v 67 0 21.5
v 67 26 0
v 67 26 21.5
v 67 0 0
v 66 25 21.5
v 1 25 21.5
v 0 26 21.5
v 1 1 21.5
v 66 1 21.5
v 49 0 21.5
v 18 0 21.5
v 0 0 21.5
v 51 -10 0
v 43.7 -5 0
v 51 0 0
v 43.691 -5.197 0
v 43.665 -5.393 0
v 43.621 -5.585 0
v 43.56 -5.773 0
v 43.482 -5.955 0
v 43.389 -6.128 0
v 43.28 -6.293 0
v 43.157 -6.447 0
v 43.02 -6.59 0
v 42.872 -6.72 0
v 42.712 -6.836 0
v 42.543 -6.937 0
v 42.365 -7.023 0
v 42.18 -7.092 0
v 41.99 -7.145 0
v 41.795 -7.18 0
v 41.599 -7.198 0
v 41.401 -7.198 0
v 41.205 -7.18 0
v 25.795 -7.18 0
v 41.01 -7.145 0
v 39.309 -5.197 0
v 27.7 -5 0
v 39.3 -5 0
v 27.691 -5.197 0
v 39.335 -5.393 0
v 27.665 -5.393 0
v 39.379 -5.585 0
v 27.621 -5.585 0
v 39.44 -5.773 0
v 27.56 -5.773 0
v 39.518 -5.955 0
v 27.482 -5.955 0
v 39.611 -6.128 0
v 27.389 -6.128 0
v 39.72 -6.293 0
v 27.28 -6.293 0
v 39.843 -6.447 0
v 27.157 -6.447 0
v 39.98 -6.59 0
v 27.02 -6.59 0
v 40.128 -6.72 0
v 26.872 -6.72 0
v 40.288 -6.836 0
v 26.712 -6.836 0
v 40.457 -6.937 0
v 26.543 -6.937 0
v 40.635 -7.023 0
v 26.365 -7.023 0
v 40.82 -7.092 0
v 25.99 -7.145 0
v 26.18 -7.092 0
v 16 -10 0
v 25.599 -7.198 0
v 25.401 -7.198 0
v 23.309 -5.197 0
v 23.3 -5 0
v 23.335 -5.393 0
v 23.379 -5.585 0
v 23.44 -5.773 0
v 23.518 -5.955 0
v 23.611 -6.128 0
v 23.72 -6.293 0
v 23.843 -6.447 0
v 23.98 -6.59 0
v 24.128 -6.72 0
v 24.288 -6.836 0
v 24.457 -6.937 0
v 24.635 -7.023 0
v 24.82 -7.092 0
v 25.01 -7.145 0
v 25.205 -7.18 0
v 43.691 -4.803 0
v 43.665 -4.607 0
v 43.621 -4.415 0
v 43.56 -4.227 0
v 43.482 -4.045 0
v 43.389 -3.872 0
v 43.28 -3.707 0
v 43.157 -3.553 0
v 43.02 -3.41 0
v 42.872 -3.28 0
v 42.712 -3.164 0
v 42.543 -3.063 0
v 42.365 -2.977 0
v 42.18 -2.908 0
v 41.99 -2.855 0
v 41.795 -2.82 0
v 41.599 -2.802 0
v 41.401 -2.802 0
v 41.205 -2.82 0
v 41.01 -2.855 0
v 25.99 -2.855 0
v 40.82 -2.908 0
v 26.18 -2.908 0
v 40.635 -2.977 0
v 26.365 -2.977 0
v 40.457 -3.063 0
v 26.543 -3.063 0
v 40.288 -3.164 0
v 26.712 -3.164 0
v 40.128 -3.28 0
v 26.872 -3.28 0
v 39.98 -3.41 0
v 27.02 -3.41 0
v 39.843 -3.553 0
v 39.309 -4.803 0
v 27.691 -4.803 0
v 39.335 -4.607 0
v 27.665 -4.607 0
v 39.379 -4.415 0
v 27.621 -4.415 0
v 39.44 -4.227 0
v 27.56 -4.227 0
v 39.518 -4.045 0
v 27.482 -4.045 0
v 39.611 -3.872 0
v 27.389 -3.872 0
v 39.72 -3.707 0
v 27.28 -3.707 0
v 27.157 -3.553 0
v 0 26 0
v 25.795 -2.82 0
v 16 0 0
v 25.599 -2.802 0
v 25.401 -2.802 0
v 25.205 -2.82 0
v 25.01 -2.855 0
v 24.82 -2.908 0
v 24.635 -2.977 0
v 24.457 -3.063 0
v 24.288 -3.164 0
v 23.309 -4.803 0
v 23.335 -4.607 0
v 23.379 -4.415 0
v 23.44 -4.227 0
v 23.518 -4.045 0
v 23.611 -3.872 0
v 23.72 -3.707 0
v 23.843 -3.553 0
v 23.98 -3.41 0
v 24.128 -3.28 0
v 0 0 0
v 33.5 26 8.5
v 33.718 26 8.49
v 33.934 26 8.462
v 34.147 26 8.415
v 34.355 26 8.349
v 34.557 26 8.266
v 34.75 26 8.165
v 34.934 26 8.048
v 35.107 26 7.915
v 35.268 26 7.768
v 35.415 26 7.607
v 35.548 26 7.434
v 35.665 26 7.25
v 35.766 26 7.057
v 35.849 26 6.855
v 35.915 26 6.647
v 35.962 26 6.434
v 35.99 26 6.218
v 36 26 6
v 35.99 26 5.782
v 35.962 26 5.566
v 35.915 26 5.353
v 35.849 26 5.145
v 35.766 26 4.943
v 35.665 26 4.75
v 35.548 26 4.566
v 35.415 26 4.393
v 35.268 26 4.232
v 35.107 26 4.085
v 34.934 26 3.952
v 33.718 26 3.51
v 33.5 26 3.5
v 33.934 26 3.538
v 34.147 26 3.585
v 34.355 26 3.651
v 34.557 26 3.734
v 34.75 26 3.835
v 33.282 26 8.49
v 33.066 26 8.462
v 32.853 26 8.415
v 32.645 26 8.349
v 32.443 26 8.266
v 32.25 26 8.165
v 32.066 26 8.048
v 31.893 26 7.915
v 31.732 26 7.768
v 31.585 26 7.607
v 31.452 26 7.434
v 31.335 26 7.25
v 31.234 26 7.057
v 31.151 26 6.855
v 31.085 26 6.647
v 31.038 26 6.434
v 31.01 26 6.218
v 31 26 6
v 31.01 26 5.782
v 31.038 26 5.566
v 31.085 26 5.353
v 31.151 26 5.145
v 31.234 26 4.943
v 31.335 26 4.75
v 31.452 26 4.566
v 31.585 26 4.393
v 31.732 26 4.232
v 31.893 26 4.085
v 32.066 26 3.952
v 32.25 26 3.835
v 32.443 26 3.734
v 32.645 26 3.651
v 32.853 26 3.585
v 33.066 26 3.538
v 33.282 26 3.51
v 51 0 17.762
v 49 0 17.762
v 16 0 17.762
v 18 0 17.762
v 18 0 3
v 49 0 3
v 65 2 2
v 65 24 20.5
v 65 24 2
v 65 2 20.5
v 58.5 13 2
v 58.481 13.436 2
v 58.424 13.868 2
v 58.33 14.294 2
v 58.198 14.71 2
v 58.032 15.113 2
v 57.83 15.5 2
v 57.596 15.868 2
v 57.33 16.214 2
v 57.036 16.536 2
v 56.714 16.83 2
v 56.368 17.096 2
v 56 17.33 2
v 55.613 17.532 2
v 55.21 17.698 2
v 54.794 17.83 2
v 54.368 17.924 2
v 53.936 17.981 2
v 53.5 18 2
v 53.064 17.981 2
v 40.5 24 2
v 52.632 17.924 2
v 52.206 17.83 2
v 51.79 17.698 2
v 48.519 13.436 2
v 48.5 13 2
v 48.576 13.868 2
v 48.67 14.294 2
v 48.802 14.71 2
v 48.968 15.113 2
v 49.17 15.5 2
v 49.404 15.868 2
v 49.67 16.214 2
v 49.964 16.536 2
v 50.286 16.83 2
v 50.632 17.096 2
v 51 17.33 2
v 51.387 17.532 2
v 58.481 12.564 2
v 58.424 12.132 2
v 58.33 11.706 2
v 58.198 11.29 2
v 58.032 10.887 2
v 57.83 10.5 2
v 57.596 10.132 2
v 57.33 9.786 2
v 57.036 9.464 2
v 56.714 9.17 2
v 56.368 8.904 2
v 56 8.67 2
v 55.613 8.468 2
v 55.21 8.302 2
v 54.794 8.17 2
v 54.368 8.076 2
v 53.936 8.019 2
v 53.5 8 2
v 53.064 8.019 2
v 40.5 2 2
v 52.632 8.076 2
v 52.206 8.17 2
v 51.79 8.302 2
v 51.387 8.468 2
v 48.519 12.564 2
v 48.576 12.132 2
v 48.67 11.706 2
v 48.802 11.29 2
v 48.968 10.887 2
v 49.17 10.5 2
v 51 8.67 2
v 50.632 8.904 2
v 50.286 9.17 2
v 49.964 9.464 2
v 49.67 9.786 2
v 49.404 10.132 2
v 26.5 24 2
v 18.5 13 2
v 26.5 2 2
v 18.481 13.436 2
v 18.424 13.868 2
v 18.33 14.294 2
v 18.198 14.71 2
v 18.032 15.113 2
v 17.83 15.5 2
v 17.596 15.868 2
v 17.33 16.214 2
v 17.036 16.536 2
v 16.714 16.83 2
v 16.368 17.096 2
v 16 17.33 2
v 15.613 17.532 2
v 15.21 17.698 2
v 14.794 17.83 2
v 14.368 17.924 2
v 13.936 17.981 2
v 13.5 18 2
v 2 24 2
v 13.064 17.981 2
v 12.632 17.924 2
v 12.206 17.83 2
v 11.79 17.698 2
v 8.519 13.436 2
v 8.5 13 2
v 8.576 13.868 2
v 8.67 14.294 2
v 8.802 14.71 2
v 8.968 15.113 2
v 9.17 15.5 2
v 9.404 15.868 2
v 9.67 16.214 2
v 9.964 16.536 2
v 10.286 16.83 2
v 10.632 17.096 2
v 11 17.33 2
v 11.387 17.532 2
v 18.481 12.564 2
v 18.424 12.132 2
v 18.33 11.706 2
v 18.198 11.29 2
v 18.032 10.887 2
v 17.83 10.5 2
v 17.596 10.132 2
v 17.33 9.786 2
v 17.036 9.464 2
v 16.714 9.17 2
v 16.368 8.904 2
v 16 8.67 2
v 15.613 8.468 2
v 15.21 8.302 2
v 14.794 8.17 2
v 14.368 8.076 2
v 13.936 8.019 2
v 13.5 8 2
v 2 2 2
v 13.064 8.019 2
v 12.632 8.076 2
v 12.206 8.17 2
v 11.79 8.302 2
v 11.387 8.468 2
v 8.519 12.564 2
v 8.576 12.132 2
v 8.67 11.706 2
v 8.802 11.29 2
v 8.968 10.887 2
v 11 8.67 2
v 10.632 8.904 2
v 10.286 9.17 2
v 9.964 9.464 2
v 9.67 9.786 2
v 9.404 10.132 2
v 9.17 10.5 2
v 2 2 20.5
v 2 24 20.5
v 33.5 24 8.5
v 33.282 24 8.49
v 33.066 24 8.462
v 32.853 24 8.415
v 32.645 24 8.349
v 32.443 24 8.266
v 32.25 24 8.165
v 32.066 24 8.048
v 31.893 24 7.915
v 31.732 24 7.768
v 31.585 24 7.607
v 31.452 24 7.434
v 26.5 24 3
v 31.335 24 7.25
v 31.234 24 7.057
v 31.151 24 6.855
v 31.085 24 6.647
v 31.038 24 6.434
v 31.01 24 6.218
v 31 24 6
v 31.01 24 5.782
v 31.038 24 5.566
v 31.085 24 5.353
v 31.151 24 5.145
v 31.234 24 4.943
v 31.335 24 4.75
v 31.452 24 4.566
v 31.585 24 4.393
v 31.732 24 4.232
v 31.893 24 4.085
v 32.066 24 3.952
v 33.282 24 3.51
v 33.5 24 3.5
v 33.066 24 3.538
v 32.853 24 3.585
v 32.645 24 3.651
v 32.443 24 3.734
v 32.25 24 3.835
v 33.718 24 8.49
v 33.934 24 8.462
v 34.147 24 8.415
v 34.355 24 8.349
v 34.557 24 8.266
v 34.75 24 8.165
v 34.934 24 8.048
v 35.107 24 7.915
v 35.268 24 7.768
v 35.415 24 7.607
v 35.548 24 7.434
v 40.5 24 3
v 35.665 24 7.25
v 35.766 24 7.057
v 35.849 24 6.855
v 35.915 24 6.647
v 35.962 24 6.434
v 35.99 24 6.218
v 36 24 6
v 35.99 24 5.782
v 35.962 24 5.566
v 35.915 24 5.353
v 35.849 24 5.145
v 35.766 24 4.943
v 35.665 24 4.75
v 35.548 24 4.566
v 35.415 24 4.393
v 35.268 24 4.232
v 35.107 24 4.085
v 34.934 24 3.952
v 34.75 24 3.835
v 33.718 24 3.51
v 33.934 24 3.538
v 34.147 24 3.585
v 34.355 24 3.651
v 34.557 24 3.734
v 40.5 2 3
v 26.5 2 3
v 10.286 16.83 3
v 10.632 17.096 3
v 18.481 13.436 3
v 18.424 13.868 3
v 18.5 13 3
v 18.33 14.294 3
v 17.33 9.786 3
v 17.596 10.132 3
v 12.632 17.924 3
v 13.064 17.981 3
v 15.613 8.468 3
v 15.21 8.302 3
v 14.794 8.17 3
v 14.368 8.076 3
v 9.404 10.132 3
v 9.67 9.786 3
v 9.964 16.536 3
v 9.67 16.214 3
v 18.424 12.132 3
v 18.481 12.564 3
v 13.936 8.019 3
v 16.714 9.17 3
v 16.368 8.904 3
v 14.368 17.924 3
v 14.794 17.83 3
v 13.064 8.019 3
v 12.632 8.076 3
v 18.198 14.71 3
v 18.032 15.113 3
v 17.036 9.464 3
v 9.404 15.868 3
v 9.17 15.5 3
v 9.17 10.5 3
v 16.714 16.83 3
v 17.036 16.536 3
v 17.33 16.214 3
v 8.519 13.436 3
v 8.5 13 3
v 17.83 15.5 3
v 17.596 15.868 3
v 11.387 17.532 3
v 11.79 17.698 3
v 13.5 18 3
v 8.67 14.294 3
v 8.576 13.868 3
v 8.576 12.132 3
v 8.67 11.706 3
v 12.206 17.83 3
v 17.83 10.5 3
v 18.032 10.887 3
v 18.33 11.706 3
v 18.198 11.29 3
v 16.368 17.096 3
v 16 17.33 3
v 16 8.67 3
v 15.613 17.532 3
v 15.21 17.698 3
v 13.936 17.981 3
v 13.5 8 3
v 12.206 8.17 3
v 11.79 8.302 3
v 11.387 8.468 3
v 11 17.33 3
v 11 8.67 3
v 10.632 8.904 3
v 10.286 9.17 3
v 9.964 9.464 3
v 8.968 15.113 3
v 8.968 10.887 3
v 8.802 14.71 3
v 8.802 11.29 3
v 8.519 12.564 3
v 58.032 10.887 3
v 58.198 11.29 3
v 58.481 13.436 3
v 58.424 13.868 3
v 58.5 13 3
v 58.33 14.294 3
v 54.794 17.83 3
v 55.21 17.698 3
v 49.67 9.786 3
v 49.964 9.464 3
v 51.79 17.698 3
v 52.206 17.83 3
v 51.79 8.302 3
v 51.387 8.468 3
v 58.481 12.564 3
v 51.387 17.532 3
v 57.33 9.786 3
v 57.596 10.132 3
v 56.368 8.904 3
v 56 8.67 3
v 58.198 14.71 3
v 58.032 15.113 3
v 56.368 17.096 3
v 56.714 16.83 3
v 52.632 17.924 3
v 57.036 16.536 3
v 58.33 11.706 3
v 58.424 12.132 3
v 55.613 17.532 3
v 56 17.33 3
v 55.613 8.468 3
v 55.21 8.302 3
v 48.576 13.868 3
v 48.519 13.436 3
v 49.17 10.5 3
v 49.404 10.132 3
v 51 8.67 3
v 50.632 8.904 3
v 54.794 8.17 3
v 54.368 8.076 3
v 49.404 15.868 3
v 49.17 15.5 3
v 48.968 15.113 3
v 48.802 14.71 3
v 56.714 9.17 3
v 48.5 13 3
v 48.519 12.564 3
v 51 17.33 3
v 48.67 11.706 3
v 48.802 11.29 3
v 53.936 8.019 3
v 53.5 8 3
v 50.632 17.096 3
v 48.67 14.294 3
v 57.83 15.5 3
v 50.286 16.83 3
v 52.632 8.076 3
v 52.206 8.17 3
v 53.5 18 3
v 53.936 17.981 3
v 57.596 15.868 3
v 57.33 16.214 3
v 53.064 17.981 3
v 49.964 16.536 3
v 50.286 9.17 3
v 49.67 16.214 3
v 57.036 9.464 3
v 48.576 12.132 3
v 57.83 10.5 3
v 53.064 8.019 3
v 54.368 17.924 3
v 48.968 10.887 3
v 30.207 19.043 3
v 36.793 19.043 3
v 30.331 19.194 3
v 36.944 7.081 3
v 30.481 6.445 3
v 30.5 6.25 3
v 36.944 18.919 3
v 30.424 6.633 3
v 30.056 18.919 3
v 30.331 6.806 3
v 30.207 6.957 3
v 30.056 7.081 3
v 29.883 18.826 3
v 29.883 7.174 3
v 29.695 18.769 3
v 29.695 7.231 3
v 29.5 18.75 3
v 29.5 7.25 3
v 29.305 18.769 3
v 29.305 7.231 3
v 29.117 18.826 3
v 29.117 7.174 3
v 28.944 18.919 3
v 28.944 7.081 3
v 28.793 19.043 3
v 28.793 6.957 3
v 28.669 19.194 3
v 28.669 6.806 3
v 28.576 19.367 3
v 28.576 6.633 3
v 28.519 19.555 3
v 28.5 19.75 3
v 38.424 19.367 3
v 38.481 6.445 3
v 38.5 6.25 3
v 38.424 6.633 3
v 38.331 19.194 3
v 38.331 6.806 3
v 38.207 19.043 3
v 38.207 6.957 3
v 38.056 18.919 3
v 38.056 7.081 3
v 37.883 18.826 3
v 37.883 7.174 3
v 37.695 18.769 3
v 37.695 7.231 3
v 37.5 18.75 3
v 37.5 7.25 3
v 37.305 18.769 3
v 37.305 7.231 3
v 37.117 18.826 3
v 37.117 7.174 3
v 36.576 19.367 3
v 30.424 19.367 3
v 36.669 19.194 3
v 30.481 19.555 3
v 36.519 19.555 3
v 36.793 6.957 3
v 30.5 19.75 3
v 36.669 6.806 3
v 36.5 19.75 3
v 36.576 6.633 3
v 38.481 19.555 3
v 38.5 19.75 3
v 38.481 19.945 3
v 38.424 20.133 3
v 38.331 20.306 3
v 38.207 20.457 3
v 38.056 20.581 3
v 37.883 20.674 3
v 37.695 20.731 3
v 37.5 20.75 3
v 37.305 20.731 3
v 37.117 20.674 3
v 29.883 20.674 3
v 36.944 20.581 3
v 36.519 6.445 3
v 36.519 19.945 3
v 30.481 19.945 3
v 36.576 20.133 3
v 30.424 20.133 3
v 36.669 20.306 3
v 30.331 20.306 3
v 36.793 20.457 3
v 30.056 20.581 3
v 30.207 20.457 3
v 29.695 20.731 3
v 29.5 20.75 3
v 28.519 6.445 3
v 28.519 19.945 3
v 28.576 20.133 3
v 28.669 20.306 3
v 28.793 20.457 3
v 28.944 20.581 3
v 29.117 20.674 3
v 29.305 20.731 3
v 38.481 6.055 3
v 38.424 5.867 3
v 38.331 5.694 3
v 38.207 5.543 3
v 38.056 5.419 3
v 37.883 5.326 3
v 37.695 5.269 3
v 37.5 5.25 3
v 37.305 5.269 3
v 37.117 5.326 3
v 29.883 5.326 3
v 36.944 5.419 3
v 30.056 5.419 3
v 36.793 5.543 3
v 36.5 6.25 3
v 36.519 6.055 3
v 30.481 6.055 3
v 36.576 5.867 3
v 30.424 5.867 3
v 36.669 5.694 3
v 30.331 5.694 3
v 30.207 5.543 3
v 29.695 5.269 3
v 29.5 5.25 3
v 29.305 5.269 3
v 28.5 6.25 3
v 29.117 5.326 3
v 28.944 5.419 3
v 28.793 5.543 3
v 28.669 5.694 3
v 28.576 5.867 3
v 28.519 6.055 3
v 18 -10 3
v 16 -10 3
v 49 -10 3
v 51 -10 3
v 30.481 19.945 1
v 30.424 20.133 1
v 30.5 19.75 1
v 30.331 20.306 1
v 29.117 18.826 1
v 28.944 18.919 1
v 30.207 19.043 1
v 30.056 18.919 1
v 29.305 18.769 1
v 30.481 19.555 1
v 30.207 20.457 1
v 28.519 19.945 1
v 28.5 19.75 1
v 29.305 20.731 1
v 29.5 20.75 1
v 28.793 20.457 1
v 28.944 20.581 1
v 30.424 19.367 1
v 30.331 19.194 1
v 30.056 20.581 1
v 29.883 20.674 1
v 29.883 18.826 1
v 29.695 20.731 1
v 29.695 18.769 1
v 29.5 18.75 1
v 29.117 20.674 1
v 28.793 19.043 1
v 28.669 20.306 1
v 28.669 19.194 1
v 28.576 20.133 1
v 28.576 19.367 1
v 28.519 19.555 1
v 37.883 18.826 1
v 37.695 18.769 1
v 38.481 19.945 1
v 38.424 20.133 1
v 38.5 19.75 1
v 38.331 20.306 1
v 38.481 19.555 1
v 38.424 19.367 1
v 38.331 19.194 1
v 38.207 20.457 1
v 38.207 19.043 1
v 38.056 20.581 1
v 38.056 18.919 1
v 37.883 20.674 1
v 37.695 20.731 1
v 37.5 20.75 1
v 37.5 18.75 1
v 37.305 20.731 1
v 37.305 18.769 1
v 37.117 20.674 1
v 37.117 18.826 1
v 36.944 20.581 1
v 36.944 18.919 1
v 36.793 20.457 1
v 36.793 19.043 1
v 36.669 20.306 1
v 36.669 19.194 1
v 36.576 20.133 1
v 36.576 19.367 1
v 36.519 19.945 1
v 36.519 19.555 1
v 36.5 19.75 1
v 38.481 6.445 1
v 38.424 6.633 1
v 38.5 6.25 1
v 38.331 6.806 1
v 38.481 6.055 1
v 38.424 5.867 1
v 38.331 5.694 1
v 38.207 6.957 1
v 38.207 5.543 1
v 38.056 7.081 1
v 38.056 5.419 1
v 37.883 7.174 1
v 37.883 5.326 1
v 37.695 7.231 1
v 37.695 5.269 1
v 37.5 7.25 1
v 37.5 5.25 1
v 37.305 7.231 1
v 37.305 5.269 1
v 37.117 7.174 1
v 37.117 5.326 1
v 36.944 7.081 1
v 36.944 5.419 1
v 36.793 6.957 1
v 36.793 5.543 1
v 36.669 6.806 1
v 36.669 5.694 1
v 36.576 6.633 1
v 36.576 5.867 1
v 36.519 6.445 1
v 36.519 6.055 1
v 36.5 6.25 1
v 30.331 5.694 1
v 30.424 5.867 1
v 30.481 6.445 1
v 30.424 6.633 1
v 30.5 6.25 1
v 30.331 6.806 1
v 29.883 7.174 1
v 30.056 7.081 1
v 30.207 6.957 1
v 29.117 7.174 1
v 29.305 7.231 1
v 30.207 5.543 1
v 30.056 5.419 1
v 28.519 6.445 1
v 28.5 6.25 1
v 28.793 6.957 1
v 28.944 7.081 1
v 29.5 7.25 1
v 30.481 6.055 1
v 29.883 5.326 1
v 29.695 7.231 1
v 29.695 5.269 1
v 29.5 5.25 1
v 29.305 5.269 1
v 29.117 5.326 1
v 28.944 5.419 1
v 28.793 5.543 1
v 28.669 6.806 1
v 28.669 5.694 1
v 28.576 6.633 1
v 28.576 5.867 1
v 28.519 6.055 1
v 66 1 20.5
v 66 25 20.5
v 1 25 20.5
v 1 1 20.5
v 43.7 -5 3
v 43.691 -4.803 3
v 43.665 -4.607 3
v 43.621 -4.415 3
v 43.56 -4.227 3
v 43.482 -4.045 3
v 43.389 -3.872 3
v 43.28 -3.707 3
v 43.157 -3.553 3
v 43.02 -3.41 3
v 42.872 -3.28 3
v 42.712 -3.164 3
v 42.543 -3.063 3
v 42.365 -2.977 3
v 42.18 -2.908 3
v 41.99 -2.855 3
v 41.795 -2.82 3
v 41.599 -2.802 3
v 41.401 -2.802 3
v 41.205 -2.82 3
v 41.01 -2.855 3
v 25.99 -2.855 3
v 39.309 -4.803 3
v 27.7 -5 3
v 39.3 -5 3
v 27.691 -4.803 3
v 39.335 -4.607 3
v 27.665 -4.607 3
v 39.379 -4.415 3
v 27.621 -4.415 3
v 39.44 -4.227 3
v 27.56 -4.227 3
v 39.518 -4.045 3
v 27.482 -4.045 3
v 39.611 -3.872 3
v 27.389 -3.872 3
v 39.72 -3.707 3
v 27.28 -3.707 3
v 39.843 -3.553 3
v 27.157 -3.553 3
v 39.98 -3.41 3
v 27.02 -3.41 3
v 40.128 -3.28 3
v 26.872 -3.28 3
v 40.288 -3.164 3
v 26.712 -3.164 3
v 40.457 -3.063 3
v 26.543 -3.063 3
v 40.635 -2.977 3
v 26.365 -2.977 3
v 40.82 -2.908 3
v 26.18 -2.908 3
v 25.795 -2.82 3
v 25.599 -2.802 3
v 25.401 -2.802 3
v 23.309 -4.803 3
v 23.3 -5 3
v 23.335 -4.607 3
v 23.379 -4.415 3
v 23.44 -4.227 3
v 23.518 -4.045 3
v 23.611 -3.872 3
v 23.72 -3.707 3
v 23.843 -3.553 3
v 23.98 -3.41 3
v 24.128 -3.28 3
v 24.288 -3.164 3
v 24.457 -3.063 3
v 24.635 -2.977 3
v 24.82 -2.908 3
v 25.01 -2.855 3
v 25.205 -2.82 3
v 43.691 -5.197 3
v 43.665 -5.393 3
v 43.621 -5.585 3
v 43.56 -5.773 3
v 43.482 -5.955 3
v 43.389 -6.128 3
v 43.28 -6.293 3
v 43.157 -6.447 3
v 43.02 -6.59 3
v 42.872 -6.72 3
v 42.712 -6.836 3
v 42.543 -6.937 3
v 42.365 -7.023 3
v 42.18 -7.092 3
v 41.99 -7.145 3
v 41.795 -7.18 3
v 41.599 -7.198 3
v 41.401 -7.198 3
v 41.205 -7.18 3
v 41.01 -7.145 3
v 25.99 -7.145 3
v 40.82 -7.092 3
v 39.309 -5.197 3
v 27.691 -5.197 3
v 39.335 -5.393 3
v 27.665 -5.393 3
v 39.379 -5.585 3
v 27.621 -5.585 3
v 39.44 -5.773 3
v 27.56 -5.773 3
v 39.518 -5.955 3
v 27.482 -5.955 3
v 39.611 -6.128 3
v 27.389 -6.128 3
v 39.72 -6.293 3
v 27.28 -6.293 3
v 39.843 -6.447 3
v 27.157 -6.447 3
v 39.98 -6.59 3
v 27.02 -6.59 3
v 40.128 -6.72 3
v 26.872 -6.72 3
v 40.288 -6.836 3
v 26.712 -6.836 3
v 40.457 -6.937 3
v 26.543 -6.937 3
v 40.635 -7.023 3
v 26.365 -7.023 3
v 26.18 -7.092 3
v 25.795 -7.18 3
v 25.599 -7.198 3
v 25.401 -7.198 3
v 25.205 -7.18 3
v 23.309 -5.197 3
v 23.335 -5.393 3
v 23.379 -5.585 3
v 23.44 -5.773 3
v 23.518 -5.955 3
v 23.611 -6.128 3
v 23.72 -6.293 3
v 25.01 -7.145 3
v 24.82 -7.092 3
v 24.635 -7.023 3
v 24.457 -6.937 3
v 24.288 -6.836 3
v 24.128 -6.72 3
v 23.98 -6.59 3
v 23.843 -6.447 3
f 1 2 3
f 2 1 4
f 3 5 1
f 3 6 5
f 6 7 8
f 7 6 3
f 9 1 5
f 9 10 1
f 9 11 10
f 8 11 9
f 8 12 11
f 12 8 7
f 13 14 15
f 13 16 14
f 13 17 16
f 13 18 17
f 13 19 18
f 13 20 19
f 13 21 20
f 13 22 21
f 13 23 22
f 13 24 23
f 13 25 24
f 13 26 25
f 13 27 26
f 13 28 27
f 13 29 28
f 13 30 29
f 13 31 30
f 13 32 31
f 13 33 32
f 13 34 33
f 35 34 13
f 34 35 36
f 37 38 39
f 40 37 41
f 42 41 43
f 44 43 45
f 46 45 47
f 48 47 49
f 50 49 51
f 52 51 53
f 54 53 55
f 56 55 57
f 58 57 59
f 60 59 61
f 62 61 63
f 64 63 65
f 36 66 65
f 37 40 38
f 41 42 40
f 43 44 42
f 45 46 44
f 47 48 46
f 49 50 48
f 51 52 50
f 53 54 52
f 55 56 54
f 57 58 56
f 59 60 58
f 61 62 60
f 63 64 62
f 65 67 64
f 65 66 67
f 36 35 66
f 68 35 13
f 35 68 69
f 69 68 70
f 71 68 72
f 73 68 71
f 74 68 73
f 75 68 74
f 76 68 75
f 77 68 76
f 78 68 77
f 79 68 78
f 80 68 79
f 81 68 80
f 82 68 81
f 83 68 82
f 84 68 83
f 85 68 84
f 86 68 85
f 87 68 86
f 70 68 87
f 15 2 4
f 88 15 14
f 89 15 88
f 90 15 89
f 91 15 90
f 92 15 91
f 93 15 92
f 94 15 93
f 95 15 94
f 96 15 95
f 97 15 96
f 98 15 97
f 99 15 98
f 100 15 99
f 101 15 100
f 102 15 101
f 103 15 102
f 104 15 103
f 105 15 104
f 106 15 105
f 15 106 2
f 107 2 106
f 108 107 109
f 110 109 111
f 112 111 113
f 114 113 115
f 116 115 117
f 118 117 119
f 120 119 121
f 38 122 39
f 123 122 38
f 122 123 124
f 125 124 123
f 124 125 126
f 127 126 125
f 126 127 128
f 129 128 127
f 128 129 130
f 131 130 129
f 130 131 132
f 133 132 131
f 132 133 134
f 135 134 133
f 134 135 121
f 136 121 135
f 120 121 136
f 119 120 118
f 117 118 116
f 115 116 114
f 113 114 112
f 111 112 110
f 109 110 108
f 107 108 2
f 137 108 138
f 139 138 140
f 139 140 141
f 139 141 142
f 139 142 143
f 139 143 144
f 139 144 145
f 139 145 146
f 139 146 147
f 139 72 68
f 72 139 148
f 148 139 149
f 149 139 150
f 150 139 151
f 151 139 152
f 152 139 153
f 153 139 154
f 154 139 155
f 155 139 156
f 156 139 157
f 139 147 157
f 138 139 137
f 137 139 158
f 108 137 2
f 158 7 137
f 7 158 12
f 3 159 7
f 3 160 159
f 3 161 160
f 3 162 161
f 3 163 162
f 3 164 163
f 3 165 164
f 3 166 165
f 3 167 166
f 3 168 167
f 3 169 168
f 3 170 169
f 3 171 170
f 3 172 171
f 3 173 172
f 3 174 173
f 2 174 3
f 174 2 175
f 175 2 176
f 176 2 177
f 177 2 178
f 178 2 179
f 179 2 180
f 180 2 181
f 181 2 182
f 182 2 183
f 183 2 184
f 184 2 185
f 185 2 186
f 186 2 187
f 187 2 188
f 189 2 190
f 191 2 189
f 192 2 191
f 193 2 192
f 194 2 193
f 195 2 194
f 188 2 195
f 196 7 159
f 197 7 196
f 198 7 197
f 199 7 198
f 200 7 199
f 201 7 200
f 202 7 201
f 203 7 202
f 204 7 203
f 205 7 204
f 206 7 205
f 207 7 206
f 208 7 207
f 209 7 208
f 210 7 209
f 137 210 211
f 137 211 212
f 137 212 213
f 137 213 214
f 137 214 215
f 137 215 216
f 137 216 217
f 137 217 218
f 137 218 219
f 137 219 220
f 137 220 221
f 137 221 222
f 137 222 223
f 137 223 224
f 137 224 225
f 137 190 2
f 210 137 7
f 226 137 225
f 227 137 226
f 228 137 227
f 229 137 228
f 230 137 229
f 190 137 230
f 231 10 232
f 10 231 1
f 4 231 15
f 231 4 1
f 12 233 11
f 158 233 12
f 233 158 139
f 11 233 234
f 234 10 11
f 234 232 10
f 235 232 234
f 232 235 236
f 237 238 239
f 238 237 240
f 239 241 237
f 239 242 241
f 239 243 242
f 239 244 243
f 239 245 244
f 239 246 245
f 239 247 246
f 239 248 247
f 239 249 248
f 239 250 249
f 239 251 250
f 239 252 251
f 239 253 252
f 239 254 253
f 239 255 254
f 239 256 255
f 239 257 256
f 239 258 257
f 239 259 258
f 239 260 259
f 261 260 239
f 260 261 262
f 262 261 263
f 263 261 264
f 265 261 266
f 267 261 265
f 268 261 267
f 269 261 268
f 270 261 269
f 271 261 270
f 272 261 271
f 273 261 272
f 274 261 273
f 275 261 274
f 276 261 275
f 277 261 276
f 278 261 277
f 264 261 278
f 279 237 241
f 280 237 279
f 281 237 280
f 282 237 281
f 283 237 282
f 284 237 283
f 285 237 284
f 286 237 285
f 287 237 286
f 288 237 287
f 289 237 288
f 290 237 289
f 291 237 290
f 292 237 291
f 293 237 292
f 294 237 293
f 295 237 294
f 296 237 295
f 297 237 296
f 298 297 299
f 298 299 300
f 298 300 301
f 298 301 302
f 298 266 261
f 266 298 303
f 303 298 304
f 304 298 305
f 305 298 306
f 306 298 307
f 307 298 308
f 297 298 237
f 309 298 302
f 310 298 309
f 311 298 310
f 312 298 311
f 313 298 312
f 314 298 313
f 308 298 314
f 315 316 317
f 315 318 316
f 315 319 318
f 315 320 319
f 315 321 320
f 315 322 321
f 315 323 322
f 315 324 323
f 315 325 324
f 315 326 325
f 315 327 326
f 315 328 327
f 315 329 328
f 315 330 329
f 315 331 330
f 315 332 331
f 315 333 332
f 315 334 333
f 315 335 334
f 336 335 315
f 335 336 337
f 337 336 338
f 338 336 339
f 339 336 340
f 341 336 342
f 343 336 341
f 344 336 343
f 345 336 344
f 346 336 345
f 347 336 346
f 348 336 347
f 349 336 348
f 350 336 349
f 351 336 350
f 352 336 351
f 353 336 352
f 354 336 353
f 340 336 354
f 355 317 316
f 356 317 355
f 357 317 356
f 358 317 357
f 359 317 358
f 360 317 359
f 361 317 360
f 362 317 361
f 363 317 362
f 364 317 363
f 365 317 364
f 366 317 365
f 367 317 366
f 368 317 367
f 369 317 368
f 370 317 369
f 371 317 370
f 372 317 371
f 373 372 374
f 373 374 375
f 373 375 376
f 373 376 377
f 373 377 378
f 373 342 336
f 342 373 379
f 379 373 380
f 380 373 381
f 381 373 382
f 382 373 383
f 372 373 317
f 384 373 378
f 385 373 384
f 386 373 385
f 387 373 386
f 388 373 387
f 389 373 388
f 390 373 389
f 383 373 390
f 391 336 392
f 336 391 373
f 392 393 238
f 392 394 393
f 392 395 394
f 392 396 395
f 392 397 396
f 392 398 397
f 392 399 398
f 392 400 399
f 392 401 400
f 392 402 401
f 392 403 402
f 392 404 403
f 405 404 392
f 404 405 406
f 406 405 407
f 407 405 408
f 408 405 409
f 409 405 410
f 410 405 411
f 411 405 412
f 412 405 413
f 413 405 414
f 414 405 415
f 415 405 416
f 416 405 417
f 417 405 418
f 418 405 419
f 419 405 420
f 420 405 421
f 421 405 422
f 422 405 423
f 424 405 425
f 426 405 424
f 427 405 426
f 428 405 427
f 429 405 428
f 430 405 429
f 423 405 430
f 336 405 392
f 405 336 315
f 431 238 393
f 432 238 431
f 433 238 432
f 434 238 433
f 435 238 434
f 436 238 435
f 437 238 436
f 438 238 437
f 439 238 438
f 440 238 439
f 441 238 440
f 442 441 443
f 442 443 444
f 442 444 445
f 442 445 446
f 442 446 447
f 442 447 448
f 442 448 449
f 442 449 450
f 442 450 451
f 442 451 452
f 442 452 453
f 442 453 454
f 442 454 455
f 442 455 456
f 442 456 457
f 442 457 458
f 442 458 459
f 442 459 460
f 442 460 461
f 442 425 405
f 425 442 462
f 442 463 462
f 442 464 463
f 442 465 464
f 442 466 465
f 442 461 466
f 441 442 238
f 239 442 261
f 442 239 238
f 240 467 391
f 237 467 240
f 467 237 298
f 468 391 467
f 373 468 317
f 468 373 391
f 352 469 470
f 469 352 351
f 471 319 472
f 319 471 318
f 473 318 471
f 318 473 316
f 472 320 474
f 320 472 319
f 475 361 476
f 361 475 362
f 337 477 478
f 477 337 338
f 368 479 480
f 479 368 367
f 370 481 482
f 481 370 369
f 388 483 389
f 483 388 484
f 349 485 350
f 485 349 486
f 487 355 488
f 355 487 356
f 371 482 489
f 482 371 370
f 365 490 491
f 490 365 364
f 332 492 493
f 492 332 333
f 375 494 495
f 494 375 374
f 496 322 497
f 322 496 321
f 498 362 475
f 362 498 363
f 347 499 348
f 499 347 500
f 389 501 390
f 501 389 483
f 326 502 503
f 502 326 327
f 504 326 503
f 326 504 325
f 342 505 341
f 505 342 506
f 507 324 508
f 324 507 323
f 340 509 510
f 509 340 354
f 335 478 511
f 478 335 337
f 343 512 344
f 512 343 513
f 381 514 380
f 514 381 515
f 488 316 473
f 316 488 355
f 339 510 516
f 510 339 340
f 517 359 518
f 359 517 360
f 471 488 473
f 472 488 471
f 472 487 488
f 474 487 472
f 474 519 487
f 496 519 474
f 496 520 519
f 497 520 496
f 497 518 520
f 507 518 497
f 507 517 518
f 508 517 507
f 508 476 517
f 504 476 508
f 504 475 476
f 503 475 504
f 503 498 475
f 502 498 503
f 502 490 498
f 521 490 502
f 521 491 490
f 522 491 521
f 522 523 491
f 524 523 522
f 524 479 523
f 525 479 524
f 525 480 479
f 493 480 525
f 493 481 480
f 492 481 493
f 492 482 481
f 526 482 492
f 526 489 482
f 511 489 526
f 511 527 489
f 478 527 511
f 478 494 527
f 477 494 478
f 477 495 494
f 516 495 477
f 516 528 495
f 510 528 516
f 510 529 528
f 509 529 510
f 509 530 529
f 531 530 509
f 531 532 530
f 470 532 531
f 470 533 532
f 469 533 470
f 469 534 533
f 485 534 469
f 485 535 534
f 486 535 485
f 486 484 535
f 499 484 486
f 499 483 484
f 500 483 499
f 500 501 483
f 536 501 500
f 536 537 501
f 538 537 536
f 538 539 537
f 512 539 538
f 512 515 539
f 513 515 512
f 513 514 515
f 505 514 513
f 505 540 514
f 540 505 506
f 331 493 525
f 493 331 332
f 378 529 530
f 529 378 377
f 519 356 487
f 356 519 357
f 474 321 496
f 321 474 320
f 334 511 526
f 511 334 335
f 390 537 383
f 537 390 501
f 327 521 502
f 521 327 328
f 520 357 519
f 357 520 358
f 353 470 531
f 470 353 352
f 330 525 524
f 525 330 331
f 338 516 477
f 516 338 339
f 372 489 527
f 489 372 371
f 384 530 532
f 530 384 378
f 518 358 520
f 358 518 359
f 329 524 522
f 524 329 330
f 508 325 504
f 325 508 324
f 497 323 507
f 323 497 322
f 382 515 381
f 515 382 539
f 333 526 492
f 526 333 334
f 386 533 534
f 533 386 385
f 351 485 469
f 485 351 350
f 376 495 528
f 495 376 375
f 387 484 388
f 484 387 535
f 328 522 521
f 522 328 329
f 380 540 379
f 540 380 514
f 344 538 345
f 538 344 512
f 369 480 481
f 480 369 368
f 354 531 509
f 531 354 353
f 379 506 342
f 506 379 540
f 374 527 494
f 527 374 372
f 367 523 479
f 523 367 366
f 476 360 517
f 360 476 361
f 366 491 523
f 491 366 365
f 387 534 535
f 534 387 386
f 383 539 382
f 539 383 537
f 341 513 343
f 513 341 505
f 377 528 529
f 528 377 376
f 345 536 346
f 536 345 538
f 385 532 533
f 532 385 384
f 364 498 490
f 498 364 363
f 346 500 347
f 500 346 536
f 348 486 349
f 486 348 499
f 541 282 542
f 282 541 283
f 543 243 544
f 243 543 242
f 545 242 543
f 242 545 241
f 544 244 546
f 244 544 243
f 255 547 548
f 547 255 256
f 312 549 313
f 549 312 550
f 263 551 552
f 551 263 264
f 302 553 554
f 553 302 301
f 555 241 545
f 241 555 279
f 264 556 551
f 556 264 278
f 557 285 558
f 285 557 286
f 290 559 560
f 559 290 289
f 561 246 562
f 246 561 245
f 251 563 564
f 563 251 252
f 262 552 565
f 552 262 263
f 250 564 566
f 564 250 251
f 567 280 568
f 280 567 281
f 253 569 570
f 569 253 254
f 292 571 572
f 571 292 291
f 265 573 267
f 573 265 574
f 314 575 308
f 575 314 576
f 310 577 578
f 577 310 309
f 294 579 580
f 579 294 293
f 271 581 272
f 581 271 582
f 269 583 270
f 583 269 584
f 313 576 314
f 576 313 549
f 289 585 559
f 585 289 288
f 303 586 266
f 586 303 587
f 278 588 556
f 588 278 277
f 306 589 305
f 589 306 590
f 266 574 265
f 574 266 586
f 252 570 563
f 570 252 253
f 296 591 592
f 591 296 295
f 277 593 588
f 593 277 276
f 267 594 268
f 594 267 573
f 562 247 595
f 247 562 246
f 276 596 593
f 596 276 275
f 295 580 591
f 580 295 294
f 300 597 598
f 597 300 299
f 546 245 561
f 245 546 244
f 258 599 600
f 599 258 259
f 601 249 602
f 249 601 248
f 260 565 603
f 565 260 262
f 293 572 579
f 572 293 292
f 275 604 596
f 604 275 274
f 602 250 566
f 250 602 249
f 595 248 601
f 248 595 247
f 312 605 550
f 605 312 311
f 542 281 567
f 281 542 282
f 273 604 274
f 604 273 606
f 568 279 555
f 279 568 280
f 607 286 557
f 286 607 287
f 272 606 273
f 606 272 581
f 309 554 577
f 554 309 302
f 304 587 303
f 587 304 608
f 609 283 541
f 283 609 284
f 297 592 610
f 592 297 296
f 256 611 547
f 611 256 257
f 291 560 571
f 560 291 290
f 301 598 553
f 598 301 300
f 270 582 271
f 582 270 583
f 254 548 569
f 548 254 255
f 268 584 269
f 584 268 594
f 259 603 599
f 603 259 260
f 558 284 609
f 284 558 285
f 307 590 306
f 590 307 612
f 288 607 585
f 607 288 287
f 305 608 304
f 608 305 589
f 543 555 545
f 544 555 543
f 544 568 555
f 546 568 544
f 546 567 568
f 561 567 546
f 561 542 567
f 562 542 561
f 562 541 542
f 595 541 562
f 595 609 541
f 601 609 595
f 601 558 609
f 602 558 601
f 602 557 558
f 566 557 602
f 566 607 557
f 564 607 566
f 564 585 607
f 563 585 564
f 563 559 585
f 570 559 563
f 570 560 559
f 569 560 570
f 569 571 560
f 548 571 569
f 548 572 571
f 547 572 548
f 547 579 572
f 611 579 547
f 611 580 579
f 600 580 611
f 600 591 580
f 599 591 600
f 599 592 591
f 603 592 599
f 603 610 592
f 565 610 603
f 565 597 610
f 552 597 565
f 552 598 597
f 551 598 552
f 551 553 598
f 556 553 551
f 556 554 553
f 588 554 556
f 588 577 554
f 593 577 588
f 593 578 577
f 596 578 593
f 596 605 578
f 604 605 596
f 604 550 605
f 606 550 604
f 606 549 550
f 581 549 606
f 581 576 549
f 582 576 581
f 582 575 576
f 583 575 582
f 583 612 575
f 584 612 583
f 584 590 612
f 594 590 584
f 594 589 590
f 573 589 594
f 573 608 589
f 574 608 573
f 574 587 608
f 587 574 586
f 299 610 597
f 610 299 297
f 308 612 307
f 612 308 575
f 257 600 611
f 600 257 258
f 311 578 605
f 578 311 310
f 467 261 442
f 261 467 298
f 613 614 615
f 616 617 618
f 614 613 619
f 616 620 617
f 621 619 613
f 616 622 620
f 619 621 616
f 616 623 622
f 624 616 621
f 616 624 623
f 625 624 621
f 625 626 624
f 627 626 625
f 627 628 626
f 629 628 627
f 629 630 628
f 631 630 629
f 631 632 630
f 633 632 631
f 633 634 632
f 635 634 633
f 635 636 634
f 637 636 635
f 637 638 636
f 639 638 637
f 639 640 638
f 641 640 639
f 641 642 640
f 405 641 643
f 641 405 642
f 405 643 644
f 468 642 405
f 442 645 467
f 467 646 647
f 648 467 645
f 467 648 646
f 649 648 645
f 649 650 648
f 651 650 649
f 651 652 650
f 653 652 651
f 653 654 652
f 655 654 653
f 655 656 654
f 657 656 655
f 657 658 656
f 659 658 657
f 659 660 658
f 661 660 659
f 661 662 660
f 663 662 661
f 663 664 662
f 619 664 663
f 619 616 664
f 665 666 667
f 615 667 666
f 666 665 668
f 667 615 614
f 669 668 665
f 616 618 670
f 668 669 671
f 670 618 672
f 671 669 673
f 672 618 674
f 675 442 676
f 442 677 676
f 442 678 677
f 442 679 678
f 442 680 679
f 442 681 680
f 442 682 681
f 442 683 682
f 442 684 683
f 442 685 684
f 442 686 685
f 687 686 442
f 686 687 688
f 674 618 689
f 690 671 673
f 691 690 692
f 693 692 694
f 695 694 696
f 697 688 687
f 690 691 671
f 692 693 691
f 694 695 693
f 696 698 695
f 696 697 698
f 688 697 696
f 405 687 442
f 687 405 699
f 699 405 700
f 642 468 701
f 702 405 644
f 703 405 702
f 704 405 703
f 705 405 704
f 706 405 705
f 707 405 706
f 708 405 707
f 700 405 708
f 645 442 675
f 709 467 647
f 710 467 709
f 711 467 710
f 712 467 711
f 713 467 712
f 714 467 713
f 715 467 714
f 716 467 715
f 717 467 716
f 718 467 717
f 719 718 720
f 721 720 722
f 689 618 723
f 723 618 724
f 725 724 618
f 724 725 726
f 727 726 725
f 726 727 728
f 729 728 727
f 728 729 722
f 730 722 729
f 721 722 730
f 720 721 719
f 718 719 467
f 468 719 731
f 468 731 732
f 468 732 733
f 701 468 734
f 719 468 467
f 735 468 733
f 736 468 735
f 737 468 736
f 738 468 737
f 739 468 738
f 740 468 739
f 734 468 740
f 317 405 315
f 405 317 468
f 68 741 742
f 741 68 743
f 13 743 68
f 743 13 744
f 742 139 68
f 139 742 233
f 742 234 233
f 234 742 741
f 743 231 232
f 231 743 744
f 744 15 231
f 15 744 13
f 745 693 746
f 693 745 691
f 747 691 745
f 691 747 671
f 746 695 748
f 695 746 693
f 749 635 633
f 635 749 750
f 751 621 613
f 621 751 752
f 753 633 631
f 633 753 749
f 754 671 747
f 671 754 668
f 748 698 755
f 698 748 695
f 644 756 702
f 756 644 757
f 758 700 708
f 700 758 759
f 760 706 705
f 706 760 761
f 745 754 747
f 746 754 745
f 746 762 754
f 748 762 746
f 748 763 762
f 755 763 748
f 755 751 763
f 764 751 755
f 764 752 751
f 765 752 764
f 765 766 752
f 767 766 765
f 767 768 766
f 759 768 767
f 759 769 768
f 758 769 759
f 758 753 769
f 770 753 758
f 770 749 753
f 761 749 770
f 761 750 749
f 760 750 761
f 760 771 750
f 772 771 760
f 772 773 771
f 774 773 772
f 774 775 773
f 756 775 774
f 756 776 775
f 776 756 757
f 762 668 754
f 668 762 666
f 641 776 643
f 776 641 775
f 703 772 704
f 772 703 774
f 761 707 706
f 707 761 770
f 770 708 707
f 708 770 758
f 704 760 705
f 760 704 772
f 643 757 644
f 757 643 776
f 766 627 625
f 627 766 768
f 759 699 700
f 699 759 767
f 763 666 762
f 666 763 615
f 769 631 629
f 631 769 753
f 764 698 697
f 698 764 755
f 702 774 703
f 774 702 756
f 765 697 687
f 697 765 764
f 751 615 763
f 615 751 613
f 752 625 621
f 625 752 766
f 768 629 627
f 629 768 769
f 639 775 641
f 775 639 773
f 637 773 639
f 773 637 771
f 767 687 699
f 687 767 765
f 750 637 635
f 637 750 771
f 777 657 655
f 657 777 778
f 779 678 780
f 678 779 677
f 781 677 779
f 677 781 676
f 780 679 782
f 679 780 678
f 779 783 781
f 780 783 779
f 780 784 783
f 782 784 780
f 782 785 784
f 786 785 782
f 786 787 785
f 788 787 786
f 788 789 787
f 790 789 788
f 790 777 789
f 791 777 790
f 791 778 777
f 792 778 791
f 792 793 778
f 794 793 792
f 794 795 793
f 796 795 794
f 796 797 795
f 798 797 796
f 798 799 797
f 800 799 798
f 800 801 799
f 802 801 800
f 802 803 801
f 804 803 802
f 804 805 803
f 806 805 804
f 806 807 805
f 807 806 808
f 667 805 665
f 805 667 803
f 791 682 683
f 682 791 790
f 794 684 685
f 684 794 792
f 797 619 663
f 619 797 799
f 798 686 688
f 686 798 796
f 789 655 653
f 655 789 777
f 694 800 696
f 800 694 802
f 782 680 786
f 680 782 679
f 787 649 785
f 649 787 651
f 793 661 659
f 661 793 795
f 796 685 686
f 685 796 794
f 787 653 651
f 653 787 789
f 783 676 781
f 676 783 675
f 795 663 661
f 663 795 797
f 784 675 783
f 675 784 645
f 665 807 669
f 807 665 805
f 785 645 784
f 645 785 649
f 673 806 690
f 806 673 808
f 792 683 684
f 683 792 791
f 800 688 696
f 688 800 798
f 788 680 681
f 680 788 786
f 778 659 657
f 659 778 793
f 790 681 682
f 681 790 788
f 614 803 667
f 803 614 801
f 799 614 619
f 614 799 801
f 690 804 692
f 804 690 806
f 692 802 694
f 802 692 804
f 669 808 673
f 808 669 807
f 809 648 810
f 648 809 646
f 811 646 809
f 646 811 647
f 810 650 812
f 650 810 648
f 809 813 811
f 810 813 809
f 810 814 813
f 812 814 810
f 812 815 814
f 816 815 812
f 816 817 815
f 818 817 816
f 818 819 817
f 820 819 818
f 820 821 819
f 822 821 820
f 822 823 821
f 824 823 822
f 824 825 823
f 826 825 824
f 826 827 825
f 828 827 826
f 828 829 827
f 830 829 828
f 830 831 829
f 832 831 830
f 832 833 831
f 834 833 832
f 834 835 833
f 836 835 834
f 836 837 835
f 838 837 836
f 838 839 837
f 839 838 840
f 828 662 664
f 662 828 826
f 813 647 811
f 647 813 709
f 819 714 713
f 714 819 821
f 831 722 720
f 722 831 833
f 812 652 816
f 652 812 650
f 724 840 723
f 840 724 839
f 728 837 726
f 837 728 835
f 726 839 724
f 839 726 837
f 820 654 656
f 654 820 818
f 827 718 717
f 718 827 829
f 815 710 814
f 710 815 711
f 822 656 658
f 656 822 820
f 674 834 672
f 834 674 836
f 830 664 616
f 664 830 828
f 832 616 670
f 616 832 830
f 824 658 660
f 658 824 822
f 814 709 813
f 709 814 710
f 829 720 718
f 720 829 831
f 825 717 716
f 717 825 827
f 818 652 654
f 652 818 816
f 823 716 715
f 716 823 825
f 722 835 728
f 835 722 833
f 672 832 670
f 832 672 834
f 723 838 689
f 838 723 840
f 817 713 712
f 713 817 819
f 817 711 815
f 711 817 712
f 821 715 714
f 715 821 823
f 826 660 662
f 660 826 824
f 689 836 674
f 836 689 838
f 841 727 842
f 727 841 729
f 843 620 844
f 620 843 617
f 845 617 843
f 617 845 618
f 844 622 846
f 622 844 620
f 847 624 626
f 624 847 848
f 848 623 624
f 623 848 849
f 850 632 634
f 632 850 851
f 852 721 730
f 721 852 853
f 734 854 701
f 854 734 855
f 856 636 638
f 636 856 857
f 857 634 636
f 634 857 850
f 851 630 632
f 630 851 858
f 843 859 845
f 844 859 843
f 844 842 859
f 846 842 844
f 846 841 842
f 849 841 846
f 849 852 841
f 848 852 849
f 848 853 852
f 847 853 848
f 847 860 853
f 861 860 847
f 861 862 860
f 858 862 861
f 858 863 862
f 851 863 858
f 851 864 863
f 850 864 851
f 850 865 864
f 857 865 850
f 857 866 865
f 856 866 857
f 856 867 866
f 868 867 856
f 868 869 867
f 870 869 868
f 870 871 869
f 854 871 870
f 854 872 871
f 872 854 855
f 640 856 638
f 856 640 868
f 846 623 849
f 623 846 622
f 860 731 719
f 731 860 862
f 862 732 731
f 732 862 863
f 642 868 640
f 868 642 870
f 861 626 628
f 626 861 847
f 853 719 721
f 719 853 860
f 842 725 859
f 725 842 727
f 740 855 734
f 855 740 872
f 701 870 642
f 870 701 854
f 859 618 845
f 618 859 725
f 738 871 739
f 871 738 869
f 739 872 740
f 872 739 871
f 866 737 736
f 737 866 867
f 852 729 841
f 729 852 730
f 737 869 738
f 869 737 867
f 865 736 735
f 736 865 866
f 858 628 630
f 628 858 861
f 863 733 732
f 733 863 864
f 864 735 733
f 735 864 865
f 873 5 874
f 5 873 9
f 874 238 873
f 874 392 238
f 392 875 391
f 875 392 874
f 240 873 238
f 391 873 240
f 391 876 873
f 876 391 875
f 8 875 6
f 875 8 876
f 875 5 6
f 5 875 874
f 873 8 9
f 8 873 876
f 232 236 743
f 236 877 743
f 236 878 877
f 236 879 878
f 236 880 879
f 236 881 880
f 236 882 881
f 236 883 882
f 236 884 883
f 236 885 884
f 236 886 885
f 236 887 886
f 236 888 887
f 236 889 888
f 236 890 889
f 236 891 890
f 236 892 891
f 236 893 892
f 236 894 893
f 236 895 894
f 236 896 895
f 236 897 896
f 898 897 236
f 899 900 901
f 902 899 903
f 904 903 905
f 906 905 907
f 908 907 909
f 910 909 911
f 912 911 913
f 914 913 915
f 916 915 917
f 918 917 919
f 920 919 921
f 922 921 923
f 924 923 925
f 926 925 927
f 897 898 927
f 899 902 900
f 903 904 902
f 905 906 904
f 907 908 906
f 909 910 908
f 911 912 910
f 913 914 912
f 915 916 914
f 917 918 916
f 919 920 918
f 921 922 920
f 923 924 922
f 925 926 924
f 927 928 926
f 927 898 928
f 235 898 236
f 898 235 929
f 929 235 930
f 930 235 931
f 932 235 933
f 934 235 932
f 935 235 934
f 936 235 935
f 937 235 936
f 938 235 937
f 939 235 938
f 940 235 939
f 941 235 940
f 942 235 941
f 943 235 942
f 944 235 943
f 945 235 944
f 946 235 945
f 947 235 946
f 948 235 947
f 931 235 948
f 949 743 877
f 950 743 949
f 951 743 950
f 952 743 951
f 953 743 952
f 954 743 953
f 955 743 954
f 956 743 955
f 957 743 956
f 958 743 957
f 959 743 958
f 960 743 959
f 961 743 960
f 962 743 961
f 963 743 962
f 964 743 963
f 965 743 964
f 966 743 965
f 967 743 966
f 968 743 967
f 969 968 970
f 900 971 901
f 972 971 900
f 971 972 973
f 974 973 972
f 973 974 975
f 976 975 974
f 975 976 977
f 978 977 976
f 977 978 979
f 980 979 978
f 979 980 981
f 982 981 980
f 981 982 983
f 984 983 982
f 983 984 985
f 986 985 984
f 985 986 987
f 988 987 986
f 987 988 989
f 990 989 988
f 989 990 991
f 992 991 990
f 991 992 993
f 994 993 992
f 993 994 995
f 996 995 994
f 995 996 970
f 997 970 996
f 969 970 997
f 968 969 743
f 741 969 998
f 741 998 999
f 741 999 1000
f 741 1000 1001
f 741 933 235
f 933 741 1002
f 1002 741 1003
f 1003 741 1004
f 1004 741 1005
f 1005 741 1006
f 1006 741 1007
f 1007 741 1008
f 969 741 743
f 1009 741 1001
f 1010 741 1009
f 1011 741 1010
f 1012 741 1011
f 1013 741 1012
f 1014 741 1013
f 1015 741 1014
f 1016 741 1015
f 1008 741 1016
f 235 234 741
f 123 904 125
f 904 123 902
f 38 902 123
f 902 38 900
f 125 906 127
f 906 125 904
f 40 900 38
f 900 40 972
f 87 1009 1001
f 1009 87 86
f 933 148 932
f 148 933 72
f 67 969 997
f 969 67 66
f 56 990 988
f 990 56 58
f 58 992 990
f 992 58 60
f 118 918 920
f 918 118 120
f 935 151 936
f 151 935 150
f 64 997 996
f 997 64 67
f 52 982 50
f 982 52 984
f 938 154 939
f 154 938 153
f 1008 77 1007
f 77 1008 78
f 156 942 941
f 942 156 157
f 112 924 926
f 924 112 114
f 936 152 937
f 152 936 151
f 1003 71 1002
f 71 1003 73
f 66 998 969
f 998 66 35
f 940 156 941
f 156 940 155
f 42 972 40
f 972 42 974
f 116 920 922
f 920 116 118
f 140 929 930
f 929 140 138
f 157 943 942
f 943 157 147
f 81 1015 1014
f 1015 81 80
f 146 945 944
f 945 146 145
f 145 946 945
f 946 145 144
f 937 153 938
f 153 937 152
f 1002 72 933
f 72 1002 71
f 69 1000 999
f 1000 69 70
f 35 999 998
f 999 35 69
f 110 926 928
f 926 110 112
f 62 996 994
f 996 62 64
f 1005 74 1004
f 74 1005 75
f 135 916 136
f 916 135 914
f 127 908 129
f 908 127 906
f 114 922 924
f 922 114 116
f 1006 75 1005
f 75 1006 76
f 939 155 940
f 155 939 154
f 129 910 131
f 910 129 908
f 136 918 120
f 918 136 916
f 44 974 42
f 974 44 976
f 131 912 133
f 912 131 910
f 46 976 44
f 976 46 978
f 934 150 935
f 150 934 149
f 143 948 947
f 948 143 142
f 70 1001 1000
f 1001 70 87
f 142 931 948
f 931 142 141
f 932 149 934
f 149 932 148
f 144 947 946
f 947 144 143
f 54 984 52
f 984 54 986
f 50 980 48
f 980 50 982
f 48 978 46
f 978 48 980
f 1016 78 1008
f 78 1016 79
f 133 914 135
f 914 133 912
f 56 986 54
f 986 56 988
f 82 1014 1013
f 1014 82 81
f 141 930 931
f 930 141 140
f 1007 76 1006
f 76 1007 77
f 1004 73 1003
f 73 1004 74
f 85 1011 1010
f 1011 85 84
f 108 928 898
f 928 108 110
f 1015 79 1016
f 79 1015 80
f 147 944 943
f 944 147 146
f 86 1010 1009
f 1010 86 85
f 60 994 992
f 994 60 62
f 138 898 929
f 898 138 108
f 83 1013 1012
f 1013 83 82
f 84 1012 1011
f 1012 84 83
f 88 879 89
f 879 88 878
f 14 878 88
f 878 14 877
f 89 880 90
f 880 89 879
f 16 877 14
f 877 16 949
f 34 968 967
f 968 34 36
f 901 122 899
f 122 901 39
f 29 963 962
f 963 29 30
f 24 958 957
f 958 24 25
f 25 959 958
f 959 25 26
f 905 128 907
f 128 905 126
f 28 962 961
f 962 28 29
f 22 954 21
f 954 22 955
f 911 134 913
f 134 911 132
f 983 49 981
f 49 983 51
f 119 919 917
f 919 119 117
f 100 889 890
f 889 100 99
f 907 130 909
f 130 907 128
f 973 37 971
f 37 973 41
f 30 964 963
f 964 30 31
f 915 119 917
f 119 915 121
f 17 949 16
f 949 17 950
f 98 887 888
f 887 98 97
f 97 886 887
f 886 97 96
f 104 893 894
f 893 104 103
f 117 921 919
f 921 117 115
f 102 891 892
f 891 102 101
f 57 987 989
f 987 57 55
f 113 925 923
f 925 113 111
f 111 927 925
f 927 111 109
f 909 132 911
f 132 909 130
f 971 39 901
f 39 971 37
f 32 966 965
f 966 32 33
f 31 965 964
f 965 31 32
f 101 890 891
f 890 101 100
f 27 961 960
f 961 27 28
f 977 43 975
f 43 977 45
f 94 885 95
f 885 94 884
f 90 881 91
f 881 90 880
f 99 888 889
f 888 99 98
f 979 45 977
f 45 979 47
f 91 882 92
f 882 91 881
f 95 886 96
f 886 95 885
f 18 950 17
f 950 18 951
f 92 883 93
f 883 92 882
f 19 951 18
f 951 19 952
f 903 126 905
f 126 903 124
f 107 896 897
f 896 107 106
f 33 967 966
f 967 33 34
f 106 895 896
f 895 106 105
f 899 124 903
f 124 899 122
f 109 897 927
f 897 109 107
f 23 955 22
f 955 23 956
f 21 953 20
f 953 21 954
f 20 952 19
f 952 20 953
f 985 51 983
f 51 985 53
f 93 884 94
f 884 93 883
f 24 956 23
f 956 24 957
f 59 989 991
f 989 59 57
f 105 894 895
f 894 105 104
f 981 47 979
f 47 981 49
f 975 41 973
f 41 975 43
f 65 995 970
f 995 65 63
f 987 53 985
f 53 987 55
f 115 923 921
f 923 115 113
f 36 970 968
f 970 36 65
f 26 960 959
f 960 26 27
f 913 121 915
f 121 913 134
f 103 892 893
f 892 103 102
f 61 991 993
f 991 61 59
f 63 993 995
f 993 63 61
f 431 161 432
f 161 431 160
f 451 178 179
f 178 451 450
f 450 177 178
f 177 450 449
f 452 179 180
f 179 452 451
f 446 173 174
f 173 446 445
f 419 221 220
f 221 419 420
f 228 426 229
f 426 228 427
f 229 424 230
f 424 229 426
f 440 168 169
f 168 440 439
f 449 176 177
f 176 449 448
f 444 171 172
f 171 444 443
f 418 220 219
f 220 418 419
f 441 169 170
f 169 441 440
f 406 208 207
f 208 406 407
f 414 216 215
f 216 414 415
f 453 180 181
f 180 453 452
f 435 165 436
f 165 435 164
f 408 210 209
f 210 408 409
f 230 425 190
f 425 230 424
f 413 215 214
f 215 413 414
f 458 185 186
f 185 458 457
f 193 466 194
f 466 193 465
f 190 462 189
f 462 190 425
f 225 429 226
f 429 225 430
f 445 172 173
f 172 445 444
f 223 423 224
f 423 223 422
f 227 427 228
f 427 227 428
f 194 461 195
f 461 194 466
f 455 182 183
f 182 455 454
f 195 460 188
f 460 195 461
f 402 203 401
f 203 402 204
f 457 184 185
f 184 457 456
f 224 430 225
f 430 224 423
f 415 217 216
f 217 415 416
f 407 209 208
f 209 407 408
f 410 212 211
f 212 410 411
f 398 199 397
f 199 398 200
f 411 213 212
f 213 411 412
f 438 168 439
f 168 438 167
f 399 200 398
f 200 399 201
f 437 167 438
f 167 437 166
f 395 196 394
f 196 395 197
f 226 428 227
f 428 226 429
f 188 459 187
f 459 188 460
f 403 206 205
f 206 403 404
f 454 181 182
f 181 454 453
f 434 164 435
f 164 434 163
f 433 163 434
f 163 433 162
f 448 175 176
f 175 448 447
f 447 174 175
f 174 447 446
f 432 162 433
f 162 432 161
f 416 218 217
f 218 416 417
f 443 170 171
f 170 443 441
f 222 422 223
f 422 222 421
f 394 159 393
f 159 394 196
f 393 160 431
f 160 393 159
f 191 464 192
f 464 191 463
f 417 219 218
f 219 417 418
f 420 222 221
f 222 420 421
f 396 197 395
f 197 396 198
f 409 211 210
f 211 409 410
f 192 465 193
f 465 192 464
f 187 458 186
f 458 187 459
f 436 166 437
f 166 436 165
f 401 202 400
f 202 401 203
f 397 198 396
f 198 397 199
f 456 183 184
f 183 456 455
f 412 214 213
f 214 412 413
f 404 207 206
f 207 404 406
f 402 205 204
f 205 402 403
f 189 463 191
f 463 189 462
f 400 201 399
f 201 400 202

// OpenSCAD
// file: config.scad
$fa = 5;
$fs = 0.2;

di_m4_t = 3.6;
di_m4_d = 4.4;
di_m4_nut = 8.5;
di_m2_t = 1.8;

w = 63;
l = 22;
h = 16;
t = 2;
led_stand = 1;
p = 2.5;
// main file
include <config.scad>

module lcase()
{
	difference()
	{
		union()
		{
			difference()
			{
				cube([ w + 2 * t, l + 2 * t, h + t + led_stand + p ]);
				translate([ t, t, t ])
				cube([ w, l, h + t + led_stand + p ]);
			}

			translate([ w / 2 + t, l / 2 + t, 0 ])
			{
				translate([ -20, 0, 0 ])
				cylinder(d = 10, h = t + led_stand);
				translate([ 20, 0, 0 ])
				cylinder(d = 10, h = t + led_stand);
				translate([ 0, 0, (t + led_stand) / 2 ])
				cube([ 14, l, t + led_stand ], center = true);
			}

			translate([ w / 2 + t, 0, 1.5 ])
            
			hull()
			{
				translate([ 0, -5, 0 ])
				cube([ 35, 10, 3 ], center = true);
				translate([ 0, 1, 10 ])
				cube([ 35, 1, 14 ], center = true);
			}
		}

		translate([ w / 2 + t, l / 2 + t, 1 ])
		{
			translate([ -4, 13.5 / 2, 0 ])
			cylinder(d = 2, h = 10);
			translate([ 4, 13.5 / 2, 0 ])
			cylinder(d = 2, h = 10);
			translate([ 4, -13.5 / 2, 0 ])
			cylinder(d = 2, h = 10);
			translate([ -4, -13.5 / 2, 0 ])
			cylinder(d = 2, h = 10);
		}

		translate([ t / 2, t / 2, h + t + p ])
		cube([ w + t, l + t, p * 2 ]);
		translate([ w / 2 + t - 31 / 2, -10, 3 ])
		cube([ 31, 10, 30 ]);

		// screw holes
		translate([ w / 2 + t - 16 / 2, -5, 0 ])
		cylinder(d = di_m4_d, h = 4);
		translate([ w / 2 + t + 16 / 2, -5, 0 ])
		cylinder(d = di_m4_d, h = 4);

		// Cable hole
		translate([ w / 2 + t, 10, 6 ])
		rotate([ -90, 0, 0 ])
		cylinder(d = 5, h = 30);
	}
}

lcase();
